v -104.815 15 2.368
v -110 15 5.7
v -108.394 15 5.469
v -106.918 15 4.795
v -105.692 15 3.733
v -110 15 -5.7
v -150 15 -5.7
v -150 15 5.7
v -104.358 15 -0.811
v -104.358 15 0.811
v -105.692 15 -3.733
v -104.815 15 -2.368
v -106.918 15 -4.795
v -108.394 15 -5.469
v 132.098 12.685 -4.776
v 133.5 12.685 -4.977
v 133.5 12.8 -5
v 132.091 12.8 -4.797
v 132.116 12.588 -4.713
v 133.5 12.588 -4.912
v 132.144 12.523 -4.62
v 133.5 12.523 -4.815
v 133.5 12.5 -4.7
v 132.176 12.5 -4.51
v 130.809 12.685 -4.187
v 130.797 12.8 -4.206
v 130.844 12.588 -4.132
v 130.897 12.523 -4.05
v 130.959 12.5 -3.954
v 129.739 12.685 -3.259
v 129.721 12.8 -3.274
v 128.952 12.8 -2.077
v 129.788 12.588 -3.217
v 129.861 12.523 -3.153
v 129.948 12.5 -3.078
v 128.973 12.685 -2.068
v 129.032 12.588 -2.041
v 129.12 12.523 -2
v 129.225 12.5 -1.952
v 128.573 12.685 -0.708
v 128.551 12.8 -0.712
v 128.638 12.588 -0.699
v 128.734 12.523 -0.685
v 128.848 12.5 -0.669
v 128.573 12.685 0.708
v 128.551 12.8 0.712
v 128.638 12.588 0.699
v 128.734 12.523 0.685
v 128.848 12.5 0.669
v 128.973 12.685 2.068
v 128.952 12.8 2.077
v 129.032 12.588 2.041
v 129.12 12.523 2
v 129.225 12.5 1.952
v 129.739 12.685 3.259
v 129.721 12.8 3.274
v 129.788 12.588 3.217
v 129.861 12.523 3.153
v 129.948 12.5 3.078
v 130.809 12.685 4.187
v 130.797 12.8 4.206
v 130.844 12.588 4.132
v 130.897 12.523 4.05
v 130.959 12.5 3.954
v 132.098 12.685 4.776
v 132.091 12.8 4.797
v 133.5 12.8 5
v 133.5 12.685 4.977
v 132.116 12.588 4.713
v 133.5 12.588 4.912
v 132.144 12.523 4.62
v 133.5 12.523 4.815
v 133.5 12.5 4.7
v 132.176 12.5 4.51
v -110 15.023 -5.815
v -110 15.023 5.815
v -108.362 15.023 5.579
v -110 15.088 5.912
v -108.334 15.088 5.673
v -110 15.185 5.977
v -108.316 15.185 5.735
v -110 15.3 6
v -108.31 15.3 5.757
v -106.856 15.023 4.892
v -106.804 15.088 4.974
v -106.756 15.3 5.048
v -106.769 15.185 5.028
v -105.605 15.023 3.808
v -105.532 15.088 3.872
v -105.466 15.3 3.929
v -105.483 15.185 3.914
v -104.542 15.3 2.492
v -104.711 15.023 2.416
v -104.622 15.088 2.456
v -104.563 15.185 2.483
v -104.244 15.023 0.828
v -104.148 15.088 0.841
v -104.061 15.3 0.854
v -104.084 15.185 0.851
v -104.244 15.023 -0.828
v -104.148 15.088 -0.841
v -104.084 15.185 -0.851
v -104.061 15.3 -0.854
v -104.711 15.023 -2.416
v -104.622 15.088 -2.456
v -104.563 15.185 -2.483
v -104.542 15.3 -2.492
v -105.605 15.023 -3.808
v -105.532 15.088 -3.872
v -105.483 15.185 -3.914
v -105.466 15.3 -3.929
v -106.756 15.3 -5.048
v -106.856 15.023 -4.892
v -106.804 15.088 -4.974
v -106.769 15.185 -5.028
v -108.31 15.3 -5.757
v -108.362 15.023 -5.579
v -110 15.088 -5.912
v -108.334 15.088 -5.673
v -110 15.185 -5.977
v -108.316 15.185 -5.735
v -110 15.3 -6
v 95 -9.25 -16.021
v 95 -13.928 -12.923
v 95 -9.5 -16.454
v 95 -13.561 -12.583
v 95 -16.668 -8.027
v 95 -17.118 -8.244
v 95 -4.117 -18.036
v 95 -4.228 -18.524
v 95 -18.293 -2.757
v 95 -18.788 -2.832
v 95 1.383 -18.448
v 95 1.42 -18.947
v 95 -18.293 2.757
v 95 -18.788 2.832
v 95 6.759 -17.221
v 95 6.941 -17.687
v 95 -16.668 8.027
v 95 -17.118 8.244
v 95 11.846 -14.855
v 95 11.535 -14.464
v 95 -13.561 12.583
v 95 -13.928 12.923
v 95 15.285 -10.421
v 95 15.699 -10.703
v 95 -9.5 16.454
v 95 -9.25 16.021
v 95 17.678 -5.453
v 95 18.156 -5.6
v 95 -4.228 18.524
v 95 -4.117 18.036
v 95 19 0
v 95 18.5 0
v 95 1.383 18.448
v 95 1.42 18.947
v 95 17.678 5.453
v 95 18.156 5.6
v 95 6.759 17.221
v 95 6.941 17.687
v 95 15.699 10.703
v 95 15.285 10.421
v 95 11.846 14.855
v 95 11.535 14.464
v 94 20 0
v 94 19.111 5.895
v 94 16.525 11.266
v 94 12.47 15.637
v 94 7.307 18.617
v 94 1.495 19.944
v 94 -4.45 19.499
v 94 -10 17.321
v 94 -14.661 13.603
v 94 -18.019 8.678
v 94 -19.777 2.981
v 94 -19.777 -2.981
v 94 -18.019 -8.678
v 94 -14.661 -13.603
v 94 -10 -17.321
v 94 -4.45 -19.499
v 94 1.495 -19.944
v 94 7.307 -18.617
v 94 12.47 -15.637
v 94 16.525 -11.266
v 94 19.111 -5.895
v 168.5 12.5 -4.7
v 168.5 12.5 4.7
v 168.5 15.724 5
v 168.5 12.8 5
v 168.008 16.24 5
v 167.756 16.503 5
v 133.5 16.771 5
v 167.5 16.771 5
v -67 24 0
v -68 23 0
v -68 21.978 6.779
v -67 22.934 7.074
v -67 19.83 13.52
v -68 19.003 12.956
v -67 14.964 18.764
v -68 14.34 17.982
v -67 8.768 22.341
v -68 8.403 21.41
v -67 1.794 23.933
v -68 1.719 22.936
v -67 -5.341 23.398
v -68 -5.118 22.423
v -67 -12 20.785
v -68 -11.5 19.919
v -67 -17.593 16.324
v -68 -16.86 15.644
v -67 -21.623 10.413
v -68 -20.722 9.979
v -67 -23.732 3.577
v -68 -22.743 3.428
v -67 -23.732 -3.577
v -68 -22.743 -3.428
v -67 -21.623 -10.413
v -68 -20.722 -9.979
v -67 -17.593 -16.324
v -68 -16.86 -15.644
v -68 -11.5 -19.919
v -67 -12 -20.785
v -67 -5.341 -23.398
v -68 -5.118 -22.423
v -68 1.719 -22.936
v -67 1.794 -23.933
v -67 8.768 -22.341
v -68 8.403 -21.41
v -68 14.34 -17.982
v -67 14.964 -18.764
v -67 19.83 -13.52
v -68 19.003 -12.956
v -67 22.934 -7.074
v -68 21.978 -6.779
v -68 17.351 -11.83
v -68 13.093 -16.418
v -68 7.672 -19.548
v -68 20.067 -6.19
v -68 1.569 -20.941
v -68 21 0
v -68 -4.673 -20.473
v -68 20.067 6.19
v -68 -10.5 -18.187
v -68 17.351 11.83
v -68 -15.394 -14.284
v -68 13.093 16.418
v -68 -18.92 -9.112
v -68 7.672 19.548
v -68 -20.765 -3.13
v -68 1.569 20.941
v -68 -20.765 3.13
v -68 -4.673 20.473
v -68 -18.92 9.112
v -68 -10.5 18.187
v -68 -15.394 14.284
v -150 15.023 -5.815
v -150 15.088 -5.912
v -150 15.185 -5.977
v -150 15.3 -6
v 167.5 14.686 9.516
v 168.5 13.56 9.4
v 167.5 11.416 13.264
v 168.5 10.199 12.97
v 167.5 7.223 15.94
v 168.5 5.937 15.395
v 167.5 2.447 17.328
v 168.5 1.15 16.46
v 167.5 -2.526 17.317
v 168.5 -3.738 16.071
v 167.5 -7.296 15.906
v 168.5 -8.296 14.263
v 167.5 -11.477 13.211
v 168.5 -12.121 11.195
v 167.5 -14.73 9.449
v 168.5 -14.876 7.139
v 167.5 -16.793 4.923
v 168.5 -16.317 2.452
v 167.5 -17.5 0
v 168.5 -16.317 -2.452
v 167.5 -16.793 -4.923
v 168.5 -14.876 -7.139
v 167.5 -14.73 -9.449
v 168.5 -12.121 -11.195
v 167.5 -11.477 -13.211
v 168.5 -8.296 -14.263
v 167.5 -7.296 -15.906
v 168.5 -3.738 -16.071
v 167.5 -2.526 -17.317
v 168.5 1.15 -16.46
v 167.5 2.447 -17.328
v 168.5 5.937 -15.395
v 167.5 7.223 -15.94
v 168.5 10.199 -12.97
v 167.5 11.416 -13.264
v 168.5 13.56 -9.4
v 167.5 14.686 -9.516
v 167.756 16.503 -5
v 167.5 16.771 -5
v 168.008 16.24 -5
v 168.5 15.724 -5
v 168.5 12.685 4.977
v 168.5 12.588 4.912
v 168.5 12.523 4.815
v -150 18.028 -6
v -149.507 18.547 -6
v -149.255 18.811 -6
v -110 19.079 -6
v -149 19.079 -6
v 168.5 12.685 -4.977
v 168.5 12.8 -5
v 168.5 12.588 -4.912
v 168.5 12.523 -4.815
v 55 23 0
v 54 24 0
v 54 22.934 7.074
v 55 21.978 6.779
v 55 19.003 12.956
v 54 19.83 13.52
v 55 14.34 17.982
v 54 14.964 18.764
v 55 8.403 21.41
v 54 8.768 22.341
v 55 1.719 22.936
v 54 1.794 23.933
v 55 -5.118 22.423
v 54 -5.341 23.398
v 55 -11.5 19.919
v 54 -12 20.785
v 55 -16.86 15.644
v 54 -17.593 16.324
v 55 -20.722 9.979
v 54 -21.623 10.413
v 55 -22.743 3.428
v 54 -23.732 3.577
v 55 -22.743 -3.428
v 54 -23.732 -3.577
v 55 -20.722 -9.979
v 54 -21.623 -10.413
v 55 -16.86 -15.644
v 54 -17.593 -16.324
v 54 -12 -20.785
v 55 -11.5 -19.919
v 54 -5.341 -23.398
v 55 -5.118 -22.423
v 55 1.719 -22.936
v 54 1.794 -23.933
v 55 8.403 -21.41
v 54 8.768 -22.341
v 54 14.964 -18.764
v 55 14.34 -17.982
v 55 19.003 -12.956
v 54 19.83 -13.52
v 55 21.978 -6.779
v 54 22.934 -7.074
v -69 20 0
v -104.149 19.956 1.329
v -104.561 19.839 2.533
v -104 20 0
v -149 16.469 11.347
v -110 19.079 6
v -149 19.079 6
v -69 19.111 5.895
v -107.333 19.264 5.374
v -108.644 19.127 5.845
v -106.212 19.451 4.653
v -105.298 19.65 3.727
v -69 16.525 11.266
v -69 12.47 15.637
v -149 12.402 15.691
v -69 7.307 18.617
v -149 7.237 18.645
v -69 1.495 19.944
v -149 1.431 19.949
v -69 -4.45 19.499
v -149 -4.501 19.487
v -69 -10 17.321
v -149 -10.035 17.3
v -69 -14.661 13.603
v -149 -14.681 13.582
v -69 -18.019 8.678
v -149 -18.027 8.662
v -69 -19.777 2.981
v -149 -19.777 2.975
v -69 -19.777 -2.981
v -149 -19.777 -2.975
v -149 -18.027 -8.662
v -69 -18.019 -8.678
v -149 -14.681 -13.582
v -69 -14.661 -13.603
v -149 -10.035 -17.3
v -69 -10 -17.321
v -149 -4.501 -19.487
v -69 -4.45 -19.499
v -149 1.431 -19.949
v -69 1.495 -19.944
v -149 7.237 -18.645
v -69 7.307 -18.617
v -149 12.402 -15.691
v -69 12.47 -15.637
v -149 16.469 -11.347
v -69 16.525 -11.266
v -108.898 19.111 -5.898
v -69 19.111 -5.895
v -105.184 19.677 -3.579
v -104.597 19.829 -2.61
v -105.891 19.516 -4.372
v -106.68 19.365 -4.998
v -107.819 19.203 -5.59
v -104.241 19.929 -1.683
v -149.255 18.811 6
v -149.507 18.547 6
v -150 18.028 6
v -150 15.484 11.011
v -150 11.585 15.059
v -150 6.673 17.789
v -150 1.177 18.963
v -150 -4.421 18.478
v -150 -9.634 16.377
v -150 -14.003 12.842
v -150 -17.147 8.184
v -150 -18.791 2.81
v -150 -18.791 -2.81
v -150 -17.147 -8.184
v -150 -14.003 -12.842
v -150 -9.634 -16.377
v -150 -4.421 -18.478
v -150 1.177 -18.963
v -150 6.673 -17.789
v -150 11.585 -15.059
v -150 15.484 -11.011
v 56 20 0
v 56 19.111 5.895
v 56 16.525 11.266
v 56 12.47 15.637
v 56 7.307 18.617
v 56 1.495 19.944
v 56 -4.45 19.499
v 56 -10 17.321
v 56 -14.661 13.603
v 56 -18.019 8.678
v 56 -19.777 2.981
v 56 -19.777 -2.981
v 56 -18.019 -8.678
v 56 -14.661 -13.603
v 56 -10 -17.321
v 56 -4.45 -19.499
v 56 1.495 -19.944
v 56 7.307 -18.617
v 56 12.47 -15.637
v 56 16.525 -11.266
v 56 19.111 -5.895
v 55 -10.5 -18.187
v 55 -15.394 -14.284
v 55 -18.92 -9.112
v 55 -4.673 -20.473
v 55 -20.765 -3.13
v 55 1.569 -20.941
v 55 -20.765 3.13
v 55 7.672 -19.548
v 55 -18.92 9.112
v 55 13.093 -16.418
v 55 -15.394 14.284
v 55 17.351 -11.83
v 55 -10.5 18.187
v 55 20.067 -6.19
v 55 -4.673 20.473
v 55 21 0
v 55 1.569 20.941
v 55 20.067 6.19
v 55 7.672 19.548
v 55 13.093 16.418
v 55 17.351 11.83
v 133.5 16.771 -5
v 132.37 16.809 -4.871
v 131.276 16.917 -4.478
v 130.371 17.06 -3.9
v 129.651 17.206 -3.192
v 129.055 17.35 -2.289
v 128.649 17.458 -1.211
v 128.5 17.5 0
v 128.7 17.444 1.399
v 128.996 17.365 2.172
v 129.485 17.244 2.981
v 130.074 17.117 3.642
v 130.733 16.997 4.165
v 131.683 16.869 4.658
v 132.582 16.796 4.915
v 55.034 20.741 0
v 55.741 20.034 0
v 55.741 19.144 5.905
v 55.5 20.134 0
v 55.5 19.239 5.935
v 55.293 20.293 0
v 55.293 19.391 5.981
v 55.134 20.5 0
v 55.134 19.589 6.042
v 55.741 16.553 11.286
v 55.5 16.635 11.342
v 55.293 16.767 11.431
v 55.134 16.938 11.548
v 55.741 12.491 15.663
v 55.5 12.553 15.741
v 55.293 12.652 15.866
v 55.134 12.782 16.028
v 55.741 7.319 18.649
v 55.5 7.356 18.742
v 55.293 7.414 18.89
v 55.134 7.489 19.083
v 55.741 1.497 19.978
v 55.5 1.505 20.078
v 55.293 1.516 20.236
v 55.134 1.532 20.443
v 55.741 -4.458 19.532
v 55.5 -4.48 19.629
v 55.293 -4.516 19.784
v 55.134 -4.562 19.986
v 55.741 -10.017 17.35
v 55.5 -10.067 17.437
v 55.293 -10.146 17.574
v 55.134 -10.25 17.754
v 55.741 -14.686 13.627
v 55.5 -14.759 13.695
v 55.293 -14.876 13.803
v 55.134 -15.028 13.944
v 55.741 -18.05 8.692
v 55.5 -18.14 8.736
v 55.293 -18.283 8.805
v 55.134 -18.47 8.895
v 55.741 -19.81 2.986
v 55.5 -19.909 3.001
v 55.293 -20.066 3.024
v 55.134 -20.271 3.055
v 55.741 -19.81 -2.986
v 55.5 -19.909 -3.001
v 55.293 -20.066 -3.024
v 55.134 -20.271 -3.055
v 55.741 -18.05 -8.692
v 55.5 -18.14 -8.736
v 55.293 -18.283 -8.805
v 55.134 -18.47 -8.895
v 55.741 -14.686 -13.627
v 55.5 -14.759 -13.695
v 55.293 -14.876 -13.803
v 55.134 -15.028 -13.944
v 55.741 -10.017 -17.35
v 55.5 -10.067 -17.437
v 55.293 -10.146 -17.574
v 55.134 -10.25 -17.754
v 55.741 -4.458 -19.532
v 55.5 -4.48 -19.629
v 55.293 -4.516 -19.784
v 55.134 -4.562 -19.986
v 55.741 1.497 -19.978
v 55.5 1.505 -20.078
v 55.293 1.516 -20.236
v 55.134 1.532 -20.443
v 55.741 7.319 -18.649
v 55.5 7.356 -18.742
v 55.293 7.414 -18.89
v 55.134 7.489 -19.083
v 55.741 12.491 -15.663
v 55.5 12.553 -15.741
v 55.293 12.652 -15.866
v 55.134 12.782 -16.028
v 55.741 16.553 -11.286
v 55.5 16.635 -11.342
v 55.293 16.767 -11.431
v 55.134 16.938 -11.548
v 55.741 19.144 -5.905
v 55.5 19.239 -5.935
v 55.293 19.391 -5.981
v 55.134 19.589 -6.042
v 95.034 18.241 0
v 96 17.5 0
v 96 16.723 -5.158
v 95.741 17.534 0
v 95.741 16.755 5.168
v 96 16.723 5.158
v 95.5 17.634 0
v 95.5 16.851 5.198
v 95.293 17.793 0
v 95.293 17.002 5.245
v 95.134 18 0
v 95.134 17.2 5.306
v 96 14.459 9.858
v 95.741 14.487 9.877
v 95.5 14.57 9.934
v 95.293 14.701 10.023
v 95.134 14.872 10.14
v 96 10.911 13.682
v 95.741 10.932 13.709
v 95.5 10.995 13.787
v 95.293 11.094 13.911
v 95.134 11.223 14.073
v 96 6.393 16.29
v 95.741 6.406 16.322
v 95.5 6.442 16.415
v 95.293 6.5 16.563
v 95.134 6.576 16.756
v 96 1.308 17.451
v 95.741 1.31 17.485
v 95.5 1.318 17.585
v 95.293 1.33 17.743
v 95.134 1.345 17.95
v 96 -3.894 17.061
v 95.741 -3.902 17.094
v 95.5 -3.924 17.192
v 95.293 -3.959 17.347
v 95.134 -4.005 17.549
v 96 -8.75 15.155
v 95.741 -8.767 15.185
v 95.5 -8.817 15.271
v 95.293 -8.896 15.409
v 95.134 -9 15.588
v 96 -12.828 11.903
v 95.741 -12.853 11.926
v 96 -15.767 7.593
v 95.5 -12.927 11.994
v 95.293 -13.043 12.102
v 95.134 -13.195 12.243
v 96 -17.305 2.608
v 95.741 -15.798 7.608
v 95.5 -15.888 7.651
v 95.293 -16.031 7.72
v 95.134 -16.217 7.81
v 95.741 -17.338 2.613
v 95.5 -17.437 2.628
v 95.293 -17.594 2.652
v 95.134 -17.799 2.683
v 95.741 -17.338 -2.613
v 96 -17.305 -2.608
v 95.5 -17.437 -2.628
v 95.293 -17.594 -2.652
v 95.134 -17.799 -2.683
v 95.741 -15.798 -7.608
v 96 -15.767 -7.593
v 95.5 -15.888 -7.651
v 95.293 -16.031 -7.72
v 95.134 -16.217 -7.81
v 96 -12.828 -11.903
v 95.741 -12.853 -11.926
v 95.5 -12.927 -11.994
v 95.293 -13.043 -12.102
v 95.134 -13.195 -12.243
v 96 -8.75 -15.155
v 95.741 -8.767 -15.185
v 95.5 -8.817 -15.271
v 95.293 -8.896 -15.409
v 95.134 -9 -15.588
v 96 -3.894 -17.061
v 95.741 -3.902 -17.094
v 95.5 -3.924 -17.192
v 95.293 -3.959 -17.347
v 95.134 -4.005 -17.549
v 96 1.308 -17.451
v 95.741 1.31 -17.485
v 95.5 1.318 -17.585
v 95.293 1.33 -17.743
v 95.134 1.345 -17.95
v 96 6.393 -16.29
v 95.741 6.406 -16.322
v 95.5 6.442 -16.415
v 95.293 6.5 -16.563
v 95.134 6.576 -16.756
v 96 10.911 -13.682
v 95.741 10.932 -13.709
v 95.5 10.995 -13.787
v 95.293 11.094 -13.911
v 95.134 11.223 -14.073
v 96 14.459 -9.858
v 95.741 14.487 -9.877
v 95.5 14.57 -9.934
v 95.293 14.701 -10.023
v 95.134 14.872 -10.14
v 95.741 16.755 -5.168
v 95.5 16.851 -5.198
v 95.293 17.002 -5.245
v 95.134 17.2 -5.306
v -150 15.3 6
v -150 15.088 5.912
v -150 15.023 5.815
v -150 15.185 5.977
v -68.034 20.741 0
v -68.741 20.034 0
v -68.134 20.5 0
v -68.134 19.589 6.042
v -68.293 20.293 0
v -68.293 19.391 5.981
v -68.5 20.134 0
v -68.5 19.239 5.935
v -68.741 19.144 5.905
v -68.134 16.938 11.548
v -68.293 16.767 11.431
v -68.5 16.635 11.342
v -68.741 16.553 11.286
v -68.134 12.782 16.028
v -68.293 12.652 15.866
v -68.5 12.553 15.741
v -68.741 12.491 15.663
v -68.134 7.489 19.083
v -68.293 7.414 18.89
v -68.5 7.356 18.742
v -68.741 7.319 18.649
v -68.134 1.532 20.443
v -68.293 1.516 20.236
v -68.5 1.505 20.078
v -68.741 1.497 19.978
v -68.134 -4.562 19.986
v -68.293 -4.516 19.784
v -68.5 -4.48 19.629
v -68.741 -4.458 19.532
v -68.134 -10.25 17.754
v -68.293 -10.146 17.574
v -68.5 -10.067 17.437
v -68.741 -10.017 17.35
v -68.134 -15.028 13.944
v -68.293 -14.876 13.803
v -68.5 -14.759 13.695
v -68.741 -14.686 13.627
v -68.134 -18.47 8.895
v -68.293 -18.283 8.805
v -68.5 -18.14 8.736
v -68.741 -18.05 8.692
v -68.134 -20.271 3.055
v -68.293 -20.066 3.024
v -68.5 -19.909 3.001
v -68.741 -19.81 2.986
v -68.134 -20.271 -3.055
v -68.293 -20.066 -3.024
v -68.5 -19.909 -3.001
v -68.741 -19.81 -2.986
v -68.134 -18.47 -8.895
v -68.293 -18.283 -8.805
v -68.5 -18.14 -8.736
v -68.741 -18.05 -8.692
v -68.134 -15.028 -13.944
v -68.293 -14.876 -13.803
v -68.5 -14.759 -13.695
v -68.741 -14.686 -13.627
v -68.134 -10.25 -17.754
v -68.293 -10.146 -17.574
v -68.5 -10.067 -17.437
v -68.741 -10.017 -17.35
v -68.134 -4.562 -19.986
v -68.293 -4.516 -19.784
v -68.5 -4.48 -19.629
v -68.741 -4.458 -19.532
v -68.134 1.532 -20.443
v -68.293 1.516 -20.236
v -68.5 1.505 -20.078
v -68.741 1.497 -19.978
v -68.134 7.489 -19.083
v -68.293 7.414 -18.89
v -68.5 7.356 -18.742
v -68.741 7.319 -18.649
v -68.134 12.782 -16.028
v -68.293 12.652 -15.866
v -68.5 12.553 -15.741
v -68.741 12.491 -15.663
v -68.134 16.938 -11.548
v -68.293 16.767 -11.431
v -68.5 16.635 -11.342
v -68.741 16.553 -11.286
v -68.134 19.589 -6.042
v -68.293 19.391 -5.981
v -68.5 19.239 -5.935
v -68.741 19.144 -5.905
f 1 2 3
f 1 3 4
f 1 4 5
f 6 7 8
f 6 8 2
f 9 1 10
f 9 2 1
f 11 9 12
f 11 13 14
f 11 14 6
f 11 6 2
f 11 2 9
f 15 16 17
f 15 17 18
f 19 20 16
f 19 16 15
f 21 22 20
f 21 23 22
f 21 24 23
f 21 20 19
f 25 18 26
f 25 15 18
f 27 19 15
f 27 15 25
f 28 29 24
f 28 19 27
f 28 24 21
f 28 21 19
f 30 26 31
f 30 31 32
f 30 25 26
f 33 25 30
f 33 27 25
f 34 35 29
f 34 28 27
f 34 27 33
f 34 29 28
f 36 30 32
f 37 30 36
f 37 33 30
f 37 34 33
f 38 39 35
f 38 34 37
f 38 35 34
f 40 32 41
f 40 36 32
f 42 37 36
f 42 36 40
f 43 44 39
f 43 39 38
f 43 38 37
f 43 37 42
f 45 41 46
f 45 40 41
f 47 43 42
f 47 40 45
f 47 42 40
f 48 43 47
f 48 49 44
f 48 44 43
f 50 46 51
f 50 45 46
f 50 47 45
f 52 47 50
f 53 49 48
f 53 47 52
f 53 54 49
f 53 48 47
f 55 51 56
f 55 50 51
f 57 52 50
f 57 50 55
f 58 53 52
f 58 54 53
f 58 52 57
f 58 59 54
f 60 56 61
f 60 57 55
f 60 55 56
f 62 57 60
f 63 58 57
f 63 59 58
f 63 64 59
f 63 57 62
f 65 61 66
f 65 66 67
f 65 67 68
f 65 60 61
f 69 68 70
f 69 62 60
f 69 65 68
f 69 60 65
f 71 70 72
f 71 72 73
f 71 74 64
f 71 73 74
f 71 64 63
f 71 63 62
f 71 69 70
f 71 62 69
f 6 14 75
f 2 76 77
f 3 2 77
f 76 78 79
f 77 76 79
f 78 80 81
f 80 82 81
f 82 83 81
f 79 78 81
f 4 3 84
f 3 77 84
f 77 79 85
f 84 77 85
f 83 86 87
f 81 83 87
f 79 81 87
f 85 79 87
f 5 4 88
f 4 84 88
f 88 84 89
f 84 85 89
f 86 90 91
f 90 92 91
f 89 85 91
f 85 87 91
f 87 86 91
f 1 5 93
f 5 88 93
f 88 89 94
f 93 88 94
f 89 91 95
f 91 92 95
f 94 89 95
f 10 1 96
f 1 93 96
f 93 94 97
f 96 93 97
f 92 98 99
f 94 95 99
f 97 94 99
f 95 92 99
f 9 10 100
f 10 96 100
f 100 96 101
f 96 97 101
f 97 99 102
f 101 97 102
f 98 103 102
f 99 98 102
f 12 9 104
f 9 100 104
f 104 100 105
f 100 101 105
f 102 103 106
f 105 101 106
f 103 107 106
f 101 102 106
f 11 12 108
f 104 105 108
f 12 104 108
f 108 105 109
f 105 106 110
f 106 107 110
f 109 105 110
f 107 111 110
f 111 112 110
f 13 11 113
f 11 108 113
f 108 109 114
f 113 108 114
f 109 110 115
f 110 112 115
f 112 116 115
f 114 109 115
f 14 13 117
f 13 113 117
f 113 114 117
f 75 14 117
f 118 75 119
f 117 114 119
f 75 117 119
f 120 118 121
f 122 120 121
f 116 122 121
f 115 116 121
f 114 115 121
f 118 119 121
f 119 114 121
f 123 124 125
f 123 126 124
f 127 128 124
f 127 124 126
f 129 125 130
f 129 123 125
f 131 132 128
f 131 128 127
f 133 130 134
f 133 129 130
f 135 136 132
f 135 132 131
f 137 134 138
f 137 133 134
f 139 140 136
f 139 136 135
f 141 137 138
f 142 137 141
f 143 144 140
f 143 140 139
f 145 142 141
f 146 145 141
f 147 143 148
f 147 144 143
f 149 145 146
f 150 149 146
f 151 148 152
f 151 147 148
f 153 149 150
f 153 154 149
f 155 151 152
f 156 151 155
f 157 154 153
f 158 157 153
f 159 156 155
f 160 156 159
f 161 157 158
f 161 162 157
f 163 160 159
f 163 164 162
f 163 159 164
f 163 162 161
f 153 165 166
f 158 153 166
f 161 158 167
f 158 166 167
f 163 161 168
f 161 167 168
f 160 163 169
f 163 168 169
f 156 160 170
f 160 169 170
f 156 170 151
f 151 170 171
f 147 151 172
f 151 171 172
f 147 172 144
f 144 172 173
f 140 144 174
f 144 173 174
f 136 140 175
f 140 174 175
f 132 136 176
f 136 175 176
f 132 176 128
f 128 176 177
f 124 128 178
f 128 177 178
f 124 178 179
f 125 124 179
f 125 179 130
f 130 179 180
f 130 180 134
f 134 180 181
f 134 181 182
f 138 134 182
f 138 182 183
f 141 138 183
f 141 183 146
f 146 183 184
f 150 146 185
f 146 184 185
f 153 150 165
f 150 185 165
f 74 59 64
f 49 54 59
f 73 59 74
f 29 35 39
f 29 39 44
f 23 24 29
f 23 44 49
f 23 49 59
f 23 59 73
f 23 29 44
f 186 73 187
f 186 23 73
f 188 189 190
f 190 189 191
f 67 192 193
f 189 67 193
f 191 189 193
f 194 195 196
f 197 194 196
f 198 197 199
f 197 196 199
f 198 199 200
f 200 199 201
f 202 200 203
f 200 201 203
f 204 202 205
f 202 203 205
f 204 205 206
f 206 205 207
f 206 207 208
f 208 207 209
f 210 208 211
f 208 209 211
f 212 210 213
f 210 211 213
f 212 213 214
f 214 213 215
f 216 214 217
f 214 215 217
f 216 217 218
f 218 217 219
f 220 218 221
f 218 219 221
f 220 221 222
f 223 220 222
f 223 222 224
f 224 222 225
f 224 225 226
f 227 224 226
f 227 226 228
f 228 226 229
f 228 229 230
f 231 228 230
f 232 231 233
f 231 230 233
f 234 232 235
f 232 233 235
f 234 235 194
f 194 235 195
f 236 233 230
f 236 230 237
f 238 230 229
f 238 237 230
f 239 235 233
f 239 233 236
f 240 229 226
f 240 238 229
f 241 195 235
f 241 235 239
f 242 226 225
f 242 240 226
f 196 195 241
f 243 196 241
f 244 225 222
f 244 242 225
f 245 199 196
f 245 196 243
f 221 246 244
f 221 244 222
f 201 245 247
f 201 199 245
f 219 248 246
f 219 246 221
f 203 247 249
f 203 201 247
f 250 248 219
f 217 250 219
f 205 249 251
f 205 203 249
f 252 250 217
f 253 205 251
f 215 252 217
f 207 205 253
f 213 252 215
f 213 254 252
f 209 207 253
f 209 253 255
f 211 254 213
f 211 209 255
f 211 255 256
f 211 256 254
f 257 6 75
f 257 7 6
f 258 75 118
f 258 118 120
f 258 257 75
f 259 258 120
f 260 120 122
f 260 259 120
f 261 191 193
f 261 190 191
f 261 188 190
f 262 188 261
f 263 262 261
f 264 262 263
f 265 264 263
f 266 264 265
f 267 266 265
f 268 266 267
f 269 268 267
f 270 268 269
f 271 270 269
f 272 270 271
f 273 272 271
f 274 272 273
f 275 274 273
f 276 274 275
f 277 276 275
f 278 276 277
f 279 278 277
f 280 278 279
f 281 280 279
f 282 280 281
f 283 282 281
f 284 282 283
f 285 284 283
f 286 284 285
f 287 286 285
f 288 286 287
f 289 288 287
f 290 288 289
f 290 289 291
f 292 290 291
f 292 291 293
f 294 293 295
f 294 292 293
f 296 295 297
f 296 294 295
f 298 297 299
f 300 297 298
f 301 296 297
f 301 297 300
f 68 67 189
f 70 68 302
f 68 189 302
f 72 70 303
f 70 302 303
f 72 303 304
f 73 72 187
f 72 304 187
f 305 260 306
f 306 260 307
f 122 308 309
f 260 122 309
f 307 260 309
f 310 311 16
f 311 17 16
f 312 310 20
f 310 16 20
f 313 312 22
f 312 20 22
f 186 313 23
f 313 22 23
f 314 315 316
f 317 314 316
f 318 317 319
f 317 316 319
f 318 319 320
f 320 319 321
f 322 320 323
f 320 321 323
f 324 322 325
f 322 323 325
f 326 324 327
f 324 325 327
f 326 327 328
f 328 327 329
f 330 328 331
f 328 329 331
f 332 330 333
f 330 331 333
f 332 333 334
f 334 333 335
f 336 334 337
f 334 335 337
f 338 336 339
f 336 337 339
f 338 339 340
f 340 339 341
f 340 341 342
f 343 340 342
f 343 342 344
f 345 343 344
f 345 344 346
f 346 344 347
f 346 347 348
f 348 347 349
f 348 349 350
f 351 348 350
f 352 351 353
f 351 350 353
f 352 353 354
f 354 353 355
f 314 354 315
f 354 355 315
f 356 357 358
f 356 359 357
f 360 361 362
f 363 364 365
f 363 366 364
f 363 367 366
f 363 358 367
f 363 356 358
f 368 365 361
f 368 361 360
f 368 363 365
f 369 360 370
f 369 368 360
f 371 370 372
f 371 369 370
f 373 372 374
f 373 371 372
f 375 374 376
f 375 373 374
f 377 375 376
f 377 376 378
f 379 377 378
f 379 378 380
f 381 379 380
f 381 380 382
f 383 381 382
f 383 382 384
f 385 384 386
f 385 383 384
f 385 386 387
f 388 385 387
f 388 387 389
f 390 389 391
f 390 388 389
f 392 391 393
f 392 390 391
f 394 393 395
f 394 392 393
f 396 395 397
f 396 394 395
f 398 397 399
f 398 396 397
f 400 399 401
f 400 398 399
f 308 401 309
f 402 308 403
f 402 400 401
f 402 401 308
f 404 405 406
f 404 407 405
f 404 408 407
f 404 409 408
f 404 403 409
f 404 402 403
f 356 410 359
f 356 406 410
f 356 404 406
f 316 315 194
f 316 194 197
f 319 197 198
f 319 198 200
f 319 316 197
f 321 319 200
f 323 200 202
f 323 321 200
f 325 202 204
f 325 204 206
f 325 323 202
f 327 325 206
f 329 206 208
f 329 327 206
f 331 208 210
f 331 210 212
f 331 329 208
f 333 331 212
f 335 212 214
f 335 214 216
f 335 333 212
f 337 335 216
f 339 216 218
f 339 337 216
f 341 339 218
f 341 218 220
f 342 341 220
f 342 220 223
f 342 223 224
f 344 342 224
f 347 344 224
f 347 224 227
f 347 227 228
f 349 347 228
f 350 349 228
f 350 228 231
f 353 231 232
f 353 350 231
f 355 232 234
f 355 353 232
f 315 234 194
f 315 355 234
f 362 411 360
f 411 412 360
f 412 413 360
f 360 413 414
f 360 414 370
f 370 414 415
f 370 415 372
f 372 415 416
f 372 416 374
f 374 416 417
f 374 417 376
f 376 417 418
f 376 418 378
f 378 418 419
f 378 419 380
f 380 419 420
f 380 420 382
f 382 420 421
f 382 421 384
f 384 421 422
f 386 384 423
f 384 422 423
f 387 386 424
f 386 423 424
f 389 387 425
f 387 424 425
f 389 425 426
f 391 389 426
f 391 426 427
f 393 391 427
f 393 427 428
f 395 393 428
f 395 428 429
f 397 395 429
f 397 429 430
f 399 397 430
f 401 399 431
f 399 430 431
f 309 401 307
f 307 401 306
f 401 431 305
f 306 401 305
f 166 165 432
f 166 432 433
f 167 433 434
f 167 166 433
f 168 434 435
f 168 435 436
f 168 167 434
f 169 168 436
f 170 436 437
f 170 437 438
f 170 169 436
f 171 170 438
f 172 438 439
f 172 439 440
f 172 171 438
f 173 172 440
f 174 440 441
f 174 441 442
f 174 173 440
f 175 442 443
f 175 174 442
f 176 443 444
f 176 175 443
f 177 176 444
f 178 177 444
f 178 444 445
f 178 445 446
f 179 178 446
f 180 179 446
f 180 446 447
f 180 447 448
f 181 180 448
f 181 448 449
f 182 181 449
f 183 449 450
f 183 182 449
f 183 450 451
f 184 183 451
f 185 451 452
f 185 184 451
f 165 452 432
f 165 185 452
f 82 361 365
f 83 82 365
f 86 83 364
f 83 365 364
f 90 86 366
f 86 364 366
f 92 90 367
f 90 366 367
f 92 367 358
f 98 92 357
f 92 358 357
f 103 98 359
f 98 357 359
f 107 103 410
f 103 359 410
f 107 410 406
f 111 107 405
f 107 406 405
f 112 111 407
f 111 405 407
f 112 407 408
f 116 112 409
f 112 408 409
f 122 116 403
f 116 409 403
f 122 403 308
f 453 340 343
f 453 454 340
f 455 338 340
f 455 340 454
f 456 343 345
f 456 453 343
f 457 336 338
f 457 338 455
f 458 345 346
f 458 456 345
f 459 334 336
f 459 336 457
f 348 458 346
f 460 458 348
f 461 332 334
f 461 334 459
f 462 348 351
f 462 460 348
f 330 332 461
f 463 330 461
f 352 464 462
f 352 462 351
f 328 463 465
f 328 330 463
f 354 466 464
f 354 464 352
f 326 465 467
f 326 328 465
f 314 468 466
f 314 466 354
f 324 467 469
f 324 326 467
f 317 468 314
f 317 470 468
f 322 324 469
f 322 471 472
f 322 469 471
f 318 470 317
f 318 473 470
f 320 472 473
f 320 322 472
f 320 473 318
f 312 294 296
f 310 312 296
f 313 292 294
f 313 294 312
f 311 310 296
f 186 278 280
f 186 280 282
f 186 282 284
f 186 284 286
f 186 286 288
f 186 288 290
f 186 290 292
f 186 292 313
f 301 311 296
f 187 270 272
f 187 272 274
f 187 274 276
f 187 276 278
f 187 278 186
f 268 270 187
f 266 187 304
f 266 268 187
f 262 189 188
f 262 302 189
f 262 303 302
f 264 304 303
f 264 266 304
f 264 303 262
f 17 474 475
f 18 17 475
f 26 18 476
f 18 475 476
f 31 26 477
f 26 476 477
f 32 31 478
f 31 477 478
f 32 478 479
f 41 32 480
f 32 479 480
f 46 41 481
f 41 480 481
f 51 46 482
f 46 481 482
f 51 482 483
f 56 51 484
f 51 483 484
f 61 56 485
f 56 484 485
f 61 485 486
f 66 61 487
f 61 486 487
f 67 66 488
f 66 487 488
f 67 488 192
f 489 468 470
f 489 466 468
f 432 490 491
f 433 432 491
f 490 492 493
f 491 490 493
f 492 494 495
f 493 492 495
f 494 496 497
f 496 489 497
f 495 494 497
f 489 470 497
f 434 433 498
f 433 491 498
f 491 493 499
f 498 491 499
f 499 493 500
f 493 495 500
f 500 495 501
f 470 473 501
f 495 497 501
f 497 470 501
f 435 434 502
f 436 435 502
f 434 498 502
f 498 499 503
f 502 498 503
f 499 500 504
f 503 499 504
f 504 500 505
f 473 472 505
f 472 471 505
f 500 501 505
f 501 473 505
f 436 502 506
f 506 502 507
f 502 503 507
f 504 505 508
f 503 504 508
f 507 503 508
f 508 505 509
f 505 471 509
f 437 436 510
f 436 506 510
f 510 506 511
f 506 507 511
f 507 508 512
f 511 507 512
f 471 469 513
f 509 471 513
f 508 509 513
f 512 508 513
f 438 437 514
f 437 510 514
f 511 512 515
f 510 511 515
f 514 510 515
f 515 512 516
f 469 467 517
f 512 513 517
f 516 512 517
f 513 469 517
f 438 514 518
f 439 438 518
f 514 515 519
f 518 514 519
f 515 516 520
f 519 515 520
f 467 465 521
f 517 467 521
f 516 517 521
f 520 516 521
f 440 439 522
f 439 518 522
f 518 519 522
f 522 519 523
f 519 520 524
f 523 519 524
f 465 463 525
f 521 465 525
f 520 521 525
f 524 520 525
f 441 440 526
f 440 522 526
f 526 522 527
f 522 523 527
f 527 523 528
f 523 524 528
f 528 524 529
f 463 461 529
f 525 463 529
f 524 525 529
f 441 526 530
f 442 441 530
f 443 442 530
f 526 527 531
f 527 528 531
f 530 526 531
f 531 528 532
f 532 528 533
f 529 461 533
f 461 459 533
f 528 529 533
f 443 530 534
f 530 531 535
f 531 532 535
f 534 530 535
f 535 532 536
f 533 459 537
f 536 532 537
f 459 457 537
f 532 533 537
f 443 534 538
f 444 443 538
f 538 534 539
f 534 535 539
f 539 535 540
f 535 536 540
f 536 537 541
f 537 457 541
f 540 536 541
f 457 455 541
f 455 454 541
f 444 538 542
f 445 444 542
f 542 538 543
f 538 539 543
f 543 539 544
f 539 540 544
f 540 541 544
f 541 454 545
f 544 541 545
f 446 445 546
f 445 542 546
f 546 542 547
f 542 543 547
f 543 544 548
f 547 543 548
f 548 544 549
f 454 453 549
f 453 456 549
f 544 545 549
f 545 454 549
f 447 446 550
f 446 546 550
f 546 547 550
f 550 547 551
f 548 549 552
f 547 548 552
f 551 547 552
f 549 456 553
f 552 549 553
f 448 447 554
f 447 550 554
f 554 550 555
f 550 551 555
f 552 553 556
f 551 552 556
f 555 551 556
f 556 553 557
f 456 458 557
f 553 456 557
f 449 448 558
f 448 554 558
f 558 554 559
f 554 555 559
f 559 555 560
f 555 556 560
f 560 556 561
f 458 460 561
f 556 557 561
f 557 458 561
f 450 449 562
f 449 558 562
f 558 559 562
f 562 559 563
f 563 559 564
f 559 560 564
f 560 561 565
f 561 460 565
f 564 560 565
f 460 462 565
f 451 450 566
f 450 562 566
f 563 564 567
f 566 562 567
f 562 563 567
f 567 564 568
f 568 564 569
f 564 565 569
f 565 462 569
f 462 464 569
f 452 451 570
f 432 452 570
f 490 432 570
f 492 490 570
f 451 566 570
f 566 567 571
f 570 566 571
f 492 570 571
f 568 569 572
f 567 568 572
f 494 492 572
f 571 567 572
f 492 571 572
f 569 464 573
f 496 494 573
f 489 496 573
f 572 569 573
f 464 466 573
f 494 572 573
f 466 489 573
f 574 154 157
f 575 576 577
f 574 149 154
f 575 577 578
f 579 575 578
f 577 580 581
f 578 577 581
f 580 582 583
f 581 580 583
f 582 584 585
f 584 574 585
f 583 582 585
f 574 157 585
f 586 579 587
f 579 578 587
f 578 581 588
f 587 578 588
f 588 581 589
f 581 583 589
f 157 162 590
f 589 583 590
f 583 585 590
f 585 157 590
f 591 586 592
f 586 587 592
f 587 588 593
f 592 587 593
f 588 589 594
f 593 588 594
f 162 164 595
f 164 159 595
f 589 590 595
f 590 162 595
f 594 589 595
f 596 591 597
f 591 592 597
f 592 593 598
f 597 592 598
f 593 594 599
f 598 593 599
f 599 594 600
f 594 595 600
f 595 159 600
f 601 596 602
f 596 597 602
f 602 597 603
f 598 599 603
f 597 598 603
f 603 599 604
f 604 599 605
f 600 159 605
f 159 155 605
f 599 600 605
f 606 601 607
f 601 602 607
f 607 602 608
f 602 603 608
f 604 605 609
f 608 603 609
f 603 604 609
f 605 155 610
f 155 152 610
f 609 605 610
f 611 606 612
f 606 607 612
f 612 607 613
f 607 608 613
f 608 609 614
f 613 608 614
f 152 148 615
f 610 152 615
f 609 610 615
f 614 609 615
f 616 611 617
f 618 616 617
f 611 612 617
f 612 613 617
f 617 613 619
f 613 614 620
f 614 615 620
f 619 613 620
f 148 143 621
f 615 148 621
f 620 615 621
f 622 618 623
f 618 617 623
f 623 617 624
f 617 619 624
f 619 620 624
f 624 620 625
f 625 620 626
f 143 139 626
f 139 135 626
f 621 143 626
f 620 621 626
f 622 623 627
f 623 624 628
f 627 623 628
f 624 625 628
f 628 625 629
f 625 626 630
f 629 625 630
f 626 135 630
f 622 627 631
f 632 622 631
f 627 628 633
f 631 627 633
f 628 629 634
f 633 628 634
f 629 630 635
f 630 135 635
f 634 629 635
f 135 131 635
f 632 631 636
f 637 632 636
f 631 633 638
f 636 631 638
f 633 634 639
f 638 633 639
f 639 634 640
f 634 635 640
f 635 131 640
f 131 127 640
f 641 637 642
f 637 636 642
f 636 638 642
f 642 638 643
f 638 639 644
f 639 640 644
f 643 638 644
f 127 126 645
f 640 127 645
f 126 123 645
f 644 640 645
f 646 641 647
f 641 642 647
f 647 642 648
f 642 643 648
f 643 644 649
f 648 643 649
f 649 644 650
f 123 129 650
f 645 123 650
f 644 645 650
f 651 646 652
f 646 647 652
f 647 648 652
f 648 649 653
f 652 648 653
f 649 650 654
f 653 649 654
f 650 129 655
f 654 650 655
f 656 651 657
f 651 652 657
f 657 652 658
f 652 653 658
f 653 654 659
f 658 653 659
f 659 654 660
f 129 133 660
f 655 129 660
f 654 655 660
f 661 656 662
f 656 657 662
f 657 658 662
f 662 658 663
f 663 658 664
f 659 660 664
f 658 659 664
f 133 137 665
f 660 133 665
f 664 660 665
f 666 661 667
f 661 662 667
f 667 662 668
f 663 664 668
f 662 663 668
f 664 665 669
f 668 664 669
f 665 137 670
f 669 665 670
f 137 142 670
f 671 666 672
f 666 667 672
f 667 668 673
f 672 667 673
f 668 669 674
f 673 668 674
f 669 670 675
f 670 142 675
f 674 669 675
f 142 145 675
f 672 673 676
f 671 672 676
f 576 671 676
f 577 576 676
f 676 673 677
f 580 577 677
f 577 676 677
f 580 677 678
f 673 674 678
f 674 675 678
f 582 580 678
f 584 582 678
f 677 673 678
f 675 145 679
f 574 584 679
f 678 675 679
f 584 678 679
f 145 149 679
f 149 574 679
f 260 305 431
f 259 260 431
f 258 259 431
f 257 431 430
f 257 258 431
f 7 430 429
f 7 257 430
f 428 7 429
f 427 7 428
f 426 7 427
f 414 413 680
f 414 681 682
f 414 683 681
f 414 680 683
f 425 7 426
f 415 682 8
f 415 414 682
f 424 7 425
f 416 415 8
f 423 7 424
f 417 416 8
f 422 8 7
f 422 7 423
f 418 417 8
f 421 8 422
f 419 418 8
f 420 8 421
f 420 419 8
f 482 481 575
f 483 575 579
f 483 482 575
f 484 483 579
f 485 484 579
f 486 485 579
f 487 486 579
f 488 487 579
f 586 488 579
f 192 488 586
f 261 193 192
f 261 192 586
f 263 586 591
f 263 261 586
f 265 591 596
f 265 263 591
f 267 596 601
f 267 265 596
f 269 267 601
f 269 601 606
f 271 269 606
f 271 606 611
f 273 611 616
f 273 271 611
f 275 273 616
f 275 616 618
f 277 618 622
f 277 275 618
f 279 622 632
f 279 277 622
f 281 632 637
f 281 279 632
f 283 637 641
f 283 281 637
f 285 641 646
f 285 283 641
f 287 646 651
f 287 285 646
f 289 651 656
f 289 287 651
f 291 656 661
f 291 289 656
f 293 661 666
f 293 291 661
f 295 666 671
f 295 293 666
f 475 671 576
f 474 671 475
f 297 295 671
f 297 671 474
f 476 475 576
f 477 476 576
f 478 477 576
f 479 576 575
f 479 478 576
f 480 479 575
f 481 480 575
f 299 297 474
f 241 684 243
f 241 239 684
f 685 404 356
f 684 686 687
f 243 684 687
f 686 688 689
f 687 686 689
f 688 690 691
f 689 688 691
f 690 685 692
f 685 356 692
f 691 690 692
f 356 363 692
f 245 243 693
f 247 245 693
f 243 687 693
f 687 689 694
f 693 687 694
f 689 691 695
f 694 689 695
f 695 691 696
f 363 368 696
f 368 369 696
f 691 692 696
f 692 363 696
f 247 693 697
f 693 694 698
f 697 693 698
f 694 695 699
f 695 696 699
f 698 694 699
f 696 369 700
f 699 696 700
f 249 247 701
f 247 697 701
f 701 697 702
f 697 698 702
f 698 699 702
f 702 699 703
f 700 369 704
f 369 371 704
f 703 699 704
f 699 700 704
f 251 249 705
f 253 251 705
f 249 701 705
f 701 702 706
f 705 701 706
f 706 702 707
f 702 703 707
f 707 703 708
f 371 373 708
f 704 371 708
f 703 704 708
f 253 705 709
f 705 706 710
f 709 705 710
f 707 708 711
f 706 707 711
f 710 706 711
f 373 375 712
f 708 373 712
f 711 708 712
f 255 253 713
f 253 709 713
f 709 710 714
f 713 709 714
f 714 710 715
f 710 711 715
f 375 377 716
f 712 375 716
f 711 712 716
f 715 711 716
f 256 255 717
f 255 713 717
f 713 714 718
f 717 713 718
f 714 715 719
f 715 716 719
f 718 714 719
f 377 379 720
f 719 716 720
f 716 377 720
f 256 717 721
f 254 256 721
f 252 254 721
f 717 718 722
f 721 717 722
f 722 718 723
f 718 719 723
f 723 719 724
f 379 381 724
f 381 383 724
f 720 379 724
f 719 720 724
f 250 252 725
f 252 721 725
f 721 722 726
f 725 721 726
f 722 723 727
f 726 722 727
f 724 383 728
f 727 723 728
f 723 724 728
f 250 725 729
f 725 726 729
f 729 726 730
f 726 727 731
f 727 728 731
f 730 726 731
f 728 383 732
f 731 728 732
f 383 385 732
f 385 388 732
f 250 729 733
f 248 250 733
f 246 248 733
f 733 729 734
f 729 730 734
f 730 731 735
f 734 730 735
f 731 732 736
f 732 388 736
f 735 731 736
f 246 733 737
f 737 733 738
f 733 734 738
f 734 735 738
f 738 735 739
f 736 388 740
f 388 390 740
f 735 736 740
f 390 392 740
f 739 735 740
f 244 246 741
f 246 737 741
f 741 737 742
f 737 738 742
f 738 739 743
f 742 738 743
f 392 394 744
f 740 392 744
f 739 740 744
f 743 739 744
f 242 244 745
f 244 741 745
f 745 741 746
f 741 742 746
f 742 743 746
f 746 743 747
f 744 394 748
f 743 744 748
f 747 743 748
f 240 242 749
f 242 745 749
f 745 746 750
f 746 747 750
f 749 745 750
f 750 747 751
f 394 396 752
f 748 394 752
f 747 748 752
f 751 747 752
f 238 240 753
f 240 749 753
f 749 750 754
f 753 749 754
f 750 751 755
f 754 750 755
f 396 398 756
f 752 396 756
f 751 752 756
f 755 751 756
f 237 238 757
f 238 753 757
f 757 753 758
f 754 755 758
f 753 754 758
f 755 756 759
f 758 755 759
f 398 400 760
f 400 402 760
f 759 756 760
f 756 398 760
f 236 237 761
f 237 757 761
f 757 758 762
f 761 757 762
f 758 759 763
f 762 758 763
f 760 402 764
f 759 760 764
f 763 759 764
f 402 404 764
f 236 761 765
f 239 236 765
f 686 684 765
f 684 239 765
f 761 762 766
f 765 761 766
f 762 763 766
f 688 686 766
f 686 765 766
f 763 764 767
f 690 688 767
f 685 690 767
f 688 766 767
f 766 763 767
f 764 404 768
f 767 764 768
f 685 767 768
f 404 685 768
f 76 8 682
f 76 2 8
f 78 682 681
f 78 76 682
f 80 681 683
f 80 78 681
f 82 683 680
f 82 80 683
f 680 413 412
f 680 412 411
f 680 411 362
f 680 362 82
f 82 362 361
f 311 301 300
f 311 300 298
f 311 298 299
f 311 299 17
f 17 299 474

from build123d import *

# Parameters (mm, degrees)
CUT_EXTRUDE1_DEPTH = 5
FILLET1_R          = 0.3
CUT_EXTRUDE2_DEPTH = 5
FILLET2_R          = 0.3
CHAMFER1_SIZE      = 1
FILLET3_R          = 1


with BuildPart() as part:
    # Sketch1 → Revolve1 (revolve)
    with BuildSketch(Plane.XY):
        Polygon((-150, 0), (-150, 20), (-68, 20), (-68, 24), (55, 24), (55, 20), (95, 20), (95, 17.5), (168.5, 17.5), (168.5, 0), (34, 0), align=None)
    revolve(axis=Axis((-150, 0, 0), (1, 0, 0)))

    # Sketch2 → Cut-Extrude1 (cut)
    with BuildSketch(Plane(origin=(0, 20, 0), x_dir=(1, 0, 0), z_dir=(0, 1, 0))):
        with BuildLine():
            Line((-150, 6), (-150, -6))
            Line((-150, -6), (-110, -6))
            ThreePointArc((-110, -6), (-104, 0), (-110, 6))
            Line((-110, 6), (-150, 6))
        make_face()
    extrude(amount=-CUT_EXTRUDE1_DEPTH, mode=Mode.SUBTRACT)

    # Fillet1
    fillet1_edges = [part.edges().sort_by_distance(p)[0] for p in [
        (-130, 15, 6),
        (-104, 15, 0),
        (-130, 15, -6),
    ]]
    fillet(fillet1_edges, radius=FILLET1_R)

    # Sketch3 → Cut-Extrude2 (cut)
    with BuildSketch(Plane(origin=(0, 17.5, 0), x_dir=(1, 0, 0), z_dir=(0, 1, 0))):
        with BuildLine():
            Line((168.5, -5), (168.5, 5))
            Line((168.5, 5), (133.5, 5))
            ThreePointArc((133.5, 5), (128.5, 0), (133.5, -5))
            Line((133.5, -5), (168.5, -5))
        make_face()
    extrude(amount=-CUT_EXTRUDE2_DEPTH, mode=Mode.SUBTRACT)

    # Fillet2
    fillet2_edges = [part.edges().sort_by_distance(p)[0] for p in [
        (128.5, 12.5, 0),
        (151, 12.5, -5),
        (151, 12.5, 5),
    ]]
    fillet(fillet2_edges, radius=FILLET2_R)

    # Chamfer1
    chamfer1_edges = [part.edges().sort_by_distance(p)[0] for p in [
        (95, -20, 0),
        (55, -24, 0),
        (-68, -24, 0),
        (-150, -20, 0),
        (168.5, -17.5, 0),
    ]]
    chamfer(chamfer1_edges, length=CHAMFER1_SIZE)

    # Fillet3
    fillet3_edges = [part.edges().sort_by_distance(p)[0] for p in [
        (55, -20, 0),
        (-68, -20, 0),
        (95, -17.5, 0),
    ]]
    fillet(fillet3_edges, radius=FILLET3_R)


solid = part.part
